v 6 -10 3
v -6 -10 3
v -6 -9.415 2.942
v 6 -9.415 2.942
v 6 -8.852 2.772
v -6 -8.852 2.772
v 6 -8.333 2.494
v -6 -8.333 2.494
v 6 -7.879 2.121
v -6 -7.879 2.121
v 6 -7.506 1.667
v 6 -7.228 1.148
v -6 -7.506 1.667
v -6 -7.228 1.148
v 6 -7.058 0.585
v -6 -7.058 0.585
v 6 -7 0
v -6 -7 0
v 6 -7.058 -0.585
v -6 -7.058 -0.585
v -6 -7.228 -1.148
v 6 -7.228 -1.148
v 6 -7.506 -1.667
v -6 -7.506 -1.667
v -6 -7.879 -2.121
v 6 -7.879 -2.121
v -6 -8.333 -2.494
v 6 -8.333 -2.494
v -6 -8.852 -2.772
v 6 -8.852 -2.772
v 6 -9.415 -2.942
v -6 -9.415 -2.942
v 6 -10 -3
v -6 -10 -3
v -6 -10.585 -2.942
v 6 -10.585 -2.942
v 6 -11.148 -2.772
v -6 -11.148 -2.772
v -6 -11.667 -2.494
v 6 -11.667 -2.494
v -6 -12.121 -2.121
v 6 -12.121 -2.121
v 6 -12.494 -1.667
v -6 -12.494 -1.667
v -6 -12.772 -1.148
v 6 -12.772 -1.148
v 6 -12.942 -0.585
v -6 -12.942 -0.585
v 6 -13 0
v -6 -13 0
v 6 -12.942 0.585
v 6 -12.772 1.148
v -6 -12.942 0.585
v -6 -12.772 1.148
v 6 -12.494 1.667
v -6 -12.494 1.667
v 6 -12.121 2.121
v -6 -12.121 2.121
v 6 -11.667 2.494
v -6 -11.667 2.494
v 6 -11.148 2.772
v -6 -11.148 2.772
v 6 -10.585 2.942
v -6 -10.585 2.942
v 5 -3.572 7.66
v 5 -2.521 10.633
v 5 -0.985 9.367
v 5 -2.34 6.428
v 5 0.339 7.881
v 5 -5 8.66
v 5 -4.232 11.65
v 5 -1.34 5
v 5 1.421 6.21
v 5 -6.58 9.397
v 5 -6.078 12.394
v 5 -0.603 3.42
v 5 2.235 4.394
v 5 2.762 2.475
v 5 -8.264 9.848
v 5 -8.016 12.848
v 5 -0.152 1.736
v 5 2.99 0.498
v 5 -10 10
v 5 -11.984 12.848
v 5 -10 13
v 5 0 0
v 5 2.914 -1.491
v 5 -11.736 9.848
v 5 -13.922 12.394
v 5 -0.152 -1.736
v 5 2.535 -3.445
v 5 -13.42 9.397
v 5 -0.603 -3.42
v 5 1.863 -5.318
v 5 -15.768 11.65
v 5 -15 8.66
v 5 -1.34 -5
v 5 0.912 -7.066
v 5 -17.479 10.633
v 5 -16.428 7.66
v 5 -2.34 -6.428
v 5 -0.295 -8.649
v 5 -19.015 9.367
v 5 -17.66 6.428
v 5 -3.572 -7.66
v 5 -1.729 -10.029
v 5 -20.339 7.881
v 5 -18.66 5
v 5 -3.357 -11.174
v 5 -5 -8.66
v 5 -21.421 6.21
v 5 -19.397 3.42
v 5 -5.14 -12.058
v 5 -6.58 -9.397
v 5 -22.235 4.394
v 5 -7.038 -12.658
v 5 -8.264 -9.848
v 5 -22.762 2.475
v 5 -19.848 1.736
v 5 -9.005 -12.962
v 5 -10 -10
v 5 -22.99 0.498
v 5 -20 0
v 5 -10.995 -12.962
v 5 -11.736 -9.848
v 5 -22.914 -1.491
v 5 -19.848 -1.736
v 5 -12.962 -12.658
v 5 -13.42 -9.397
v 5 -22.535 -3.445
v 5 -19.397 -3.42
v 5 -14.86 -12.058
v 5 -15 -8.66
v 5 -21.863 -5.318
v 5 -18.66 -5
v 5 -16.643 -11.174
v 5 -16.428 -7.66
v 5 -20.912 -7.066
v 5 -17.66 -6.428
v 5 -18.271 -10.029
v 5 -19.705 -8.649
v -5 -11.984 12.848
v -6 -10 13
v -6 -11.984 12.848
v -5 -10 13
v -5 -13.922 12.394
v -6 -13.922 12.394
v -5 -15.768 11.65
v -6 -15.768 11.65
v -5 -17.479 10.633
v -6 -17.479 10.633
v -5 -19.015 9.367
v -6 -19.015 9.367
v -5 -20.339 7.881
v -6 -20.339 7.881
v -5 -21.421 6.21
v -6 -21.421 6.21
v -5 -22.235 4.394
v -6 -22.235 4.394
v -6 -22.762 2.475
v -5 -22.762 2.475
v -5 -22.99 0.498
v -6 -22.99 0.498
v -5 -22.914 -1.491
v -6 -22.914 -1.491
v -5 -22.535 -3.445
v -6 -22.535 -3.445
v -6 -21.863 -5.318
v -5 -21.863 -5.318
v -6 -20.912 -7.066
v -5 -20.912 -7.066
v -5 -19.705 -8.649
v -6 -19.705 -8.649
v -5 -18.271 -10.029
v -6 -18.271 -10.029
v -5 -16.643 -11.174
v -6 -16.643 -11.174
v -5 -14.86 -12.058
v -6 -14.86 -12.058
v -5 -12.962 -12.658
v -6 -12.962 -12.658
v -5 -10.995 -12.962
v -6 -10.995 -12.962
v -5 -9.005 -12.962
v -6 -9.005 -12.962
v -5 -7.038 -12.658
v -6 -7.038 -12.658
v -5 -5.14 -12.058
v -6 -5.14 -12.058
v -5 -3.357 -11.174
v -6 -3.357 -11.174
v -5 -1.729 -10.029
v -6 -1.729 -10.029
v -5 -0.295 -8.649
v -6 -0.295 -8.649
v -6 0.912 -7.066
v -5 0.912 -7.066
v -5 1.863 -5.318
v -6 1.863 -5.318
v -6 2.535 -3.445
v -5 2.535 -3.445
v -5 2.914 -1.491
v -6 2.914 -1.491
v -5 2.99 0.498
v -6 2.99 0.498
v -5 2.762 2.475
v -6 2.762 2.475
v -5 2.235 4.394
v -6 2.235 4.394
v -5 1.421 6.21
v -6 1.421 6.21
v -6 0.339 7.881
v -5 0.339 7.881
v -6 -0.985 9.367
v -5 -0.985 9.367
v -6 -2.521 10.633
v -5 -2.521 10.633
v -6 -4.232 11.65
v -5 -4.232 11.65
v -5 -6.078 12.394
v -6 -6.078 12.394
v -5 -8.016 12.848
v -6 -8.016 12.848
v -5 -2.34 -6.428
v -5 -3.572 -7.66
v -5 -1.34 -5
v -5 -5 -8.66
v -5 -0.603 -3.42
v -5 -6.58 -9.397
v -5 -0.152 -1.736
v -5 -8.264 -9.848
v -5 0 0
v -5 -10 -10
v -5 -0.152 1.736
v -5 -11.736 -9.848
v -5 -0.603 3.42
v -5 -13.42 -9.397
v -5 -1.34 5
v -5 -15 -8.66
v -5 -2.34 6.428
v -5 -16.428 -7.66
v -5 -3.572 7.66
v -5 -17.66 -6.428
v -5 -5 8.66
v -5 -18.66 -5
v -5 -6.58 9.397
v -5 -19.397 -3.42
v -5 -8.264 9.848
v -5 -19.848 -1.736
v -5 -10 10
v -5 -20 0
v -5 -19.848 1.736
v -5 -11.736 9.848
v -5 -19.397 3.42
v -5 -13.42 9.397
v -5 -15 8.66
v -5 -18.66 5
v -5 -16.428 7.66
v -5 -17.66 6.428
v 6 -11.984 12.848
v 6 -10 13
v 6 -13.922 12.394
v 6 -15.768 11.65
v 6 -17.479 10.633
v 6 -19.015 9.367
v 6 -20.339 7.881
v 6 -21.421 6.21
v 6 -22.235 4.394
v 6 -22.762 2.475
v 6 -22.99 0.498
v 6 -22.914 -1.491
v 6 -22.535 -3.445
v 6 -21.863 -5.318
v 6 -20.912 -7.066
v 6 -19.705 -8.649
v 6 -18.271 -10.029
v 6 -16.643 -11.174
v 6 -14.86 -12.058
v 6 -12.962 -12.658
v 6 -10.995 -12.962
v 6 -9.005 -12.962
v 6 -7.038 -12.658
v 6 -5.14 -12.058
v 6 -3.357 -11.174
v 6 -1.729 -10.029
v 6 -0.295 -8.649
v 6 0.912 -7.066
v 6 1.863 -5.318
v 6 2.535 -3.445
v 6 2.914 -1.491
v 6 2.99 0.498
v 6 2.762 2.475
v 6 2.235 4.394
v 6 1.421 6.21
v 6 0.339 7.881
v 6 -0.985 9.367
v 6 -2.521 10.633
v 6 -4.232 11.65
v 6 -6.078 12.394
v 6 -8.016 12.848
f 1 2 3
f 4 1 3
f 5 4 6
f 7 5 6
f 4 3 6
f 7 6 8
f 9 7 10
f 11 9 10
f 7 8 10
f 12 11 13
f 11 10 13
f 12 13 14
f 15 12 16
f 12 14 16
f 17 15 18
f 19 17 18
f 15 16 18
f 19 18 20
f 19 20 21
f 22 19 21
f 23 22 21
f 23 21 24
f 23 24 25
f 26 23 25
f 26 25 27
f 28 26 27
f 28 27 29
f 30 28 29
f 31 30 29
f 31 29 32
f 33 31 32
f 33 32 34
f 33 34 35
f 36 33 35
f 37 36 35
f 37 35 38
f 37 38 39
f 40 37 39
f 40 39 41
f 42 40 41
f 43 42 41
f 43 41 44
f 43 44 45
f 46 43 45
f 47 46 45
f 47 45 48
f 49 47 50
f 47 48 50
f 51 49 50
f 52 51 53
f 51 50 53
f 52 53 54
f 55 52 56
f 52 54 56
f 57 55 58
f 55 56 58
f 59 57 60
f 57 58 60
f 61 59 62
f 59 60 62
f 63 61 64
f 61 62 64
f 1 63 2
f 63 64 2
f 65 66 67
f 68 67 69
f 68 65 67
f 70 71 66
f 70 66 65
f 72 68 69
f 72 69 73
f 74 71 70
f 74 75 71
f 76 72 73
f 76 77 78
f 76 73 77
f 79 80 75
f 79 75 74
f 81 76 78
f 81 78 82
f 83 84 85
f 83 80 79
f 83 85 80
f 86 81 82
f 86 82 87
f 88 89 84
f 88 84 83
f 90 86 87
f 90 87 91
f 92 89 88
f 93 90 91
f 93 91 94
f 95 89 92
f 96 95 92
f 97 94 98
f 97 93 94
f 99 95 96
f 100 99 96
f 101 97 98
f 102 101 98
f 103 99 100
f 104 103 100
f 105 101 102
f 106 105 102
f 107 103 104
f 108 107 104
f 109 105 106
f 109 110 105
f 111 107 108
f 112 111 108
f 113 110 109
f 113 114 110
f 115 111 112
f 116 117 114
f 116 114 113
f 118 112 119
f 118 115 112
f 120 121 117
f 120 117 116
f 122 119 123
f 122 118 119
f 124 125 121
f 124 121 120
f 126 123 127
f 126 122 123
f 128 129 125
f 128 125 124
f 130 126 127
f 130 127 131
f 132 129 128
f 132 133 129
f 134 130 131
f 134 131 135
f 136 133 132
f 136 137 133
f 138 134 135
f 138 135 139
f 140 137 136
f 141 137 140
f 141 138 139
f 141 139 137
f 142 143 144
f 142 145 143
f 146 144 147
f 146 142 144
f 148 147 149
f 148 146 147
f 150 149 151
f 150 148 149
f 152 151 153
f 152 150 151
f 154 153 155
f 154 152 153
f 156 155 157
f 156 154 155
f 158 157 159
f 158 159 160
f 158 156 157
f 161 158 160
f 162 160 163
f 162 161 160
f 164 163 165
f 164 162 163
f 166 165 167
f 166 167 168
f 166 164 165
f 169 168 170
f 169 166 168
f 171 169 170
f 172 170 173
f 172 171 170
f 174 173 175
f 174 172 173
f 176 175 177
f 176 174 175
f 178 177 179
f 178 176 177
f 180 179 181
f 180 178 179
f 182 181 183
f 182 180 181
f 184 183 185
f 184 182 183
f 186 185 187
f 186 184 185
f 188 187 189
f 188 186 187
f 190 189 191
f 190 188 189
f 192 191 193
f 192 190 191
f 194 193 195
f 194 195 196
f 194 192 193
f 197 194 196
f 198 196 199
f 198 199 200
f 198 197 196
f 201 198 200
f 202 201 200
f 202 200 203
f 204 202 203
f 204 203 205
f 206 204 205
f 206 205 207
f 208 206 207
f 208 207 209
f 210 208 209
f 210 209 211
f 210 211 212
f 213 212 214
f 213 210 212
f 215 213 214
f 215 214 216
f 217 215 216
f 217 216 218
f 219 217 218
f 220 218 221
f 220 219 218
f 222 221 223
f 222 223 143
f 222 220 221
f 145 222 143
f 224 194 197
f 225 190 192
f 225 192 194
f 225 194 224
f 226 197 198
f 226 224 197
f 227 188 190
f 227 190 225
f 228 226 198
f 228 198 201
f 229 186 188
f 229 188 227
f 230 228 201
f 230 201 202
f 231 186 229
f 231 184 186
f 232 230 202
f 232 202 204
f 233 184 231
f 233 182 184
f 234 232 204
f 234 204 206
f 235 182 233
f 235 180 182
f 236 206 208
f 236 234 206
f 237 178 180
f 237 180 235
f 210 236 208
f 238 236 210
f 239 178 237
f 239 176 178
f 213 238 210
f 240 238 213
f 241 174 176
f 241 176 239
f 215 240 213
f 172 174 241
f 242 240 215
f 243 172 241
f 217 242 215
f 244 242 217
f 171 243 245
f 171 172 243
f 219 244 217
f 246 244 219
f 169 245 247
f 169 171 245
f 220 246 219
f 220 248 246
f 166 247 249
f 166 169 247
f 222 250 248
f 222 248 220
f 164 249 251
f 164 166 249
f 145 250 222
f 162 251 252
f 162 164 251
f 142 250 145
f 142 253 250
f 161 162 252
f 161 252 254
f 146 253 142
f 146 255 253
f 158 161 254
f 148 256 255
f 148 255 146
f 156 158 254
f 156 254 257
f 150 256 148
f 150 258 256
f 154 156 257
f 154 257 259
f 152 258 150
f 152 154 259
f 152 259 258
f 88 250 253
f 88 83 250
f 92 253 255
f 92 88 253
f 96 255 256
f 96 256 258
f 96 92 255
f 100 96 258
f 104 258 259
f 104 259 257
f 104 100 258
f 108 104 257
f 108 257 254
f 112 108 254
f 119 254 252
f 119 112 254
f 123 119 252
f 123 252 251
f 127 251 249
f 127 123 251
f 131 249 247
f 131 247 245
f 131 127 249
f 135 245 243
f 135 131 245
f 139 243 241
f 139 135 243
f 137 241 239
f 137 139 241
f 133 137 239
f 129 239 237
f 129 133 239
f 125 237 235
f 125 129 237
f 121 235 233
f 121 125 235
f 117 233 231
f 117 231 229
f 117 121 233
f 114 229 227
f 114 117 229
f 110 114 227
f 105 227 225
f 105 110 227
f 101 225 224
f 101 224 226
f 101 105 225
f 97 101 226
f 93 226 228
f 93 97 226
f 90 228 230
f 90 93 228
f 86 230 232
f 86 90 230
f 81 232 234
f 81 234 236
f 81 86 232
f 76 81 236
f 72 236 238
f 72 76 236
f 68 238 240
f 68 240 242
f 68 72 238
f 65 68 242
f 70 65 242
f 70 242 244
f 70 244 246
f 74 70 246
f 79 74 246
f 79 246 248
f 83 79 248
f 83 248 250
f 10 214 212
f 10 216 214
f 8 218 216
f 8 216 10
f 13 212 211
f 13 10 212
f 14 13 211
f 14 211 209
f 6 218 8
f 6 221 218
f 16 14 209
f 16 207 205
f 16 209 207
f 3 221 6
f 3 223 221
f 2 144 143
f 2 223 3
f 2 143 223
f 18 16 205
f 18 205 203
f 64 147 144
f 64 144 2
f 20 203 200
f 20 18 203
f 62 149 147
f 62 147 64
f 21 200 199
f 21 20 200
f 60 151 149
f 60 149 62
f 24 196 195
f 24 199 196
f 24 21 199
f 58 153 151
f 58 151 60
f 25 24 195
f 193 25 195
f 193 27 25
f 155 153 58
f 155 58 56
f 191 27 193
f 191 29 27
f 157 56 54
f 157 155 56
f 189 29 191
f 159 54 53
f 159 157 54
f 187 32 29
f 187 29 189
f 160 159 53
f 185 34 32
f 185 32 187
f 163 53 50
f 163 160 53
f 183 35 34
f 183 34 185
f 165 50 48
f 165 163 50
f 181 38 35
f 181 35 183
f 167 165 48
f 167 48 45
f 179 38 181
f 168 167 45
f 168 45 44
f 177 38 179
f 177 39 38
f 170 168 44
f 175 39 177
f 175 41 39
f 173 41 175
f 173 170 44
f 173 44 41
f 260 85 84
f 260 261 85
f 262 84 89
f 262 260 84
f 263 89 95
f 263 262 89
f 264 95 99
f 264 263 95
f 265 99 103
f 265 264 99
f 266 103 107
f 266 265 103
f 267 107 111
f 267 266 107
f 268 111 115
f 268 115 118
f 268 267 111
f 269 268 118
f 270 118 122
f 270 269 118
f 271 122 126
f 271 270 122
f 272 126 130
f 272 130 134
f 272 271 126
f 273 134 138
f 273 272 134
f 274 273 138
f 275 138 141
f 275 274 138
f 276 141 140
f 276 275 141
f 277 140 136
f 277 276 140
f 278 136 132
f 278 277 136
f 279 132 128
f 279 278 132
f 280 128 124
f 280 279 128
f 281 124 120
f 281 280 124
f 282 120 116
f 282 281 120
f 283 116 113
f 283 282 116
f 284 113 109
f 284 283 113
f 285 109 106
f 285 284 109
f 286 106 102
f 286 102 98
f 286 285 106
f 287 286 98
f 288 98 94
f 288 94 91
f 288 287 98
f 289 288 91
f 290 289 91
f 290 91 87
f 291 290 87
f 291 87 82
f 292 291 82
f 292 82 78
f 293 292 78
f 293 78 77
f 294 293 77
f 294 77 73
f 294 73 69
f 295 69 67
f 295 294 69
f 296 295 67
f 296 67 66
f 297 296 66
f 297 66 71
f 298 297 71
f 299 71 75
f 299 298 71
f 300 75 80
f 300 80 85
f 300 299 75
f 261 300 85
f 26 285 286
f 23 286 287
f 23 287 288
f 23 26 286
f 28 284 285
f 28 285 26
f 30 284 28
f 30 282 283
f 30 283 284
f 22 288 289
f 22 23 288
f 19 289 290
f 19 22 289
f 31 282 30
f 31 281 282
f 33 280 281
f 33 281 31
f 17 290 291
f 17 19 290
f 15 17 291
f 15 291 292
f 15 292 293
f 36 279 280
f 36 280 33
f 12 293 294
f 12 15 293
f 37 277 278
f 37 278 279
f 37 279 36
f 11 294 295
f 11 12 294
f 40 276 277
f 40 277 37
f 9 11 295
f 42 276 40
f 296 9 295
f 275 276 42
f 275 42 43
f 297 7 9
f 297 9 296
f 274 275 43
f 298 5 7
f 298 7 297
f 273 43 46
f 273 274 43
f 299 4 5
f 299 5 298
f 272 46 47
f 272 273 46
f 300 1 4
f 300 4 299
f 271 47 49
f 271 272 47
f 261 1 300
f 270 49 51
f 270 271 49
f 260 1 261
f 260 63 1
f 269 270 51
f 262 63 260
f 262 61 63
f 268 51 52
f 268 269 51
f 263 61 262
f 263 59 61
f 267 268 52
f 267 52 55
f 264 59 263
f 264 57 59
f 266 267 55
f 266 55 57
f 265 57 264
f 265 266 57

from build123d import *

# Parameters (mm, degrees)
SKETCH2_R          = 3
CUT_EXTRUDE1_DEPTH = 30.017236257


with BuildPart() as part:
    # Sketch1 → Revolve1 (revolve)
    with BuildSketch(Plane.XY, mode=Mode.PRIVATE) as revolve1_sk:
        Polygon((-6, 3), (-5, 3), (-5, 0), (5, 0), (5, 3), (6, 3), (6, -10), (-6, -10), align=None)
    revolve(revolve1_sk.sketch.rotate(Axis((-6, -10, 0), (1, 0, 0)), 90), axis=Axis((-6, -10, 0), (1, 0, 0)))

    # Sketch2 → Cut-Extrude1 (cut, through all)
    with BuildSketch(Plane.ZY.offset(6)):
        with Locations((0, -10)):
            Circle(SKETCH2_R)
    extrude(amount=-CUT_EXTRUDE1_DEPTH, mode=Mode.SUBTRACT)


solid = part.part
